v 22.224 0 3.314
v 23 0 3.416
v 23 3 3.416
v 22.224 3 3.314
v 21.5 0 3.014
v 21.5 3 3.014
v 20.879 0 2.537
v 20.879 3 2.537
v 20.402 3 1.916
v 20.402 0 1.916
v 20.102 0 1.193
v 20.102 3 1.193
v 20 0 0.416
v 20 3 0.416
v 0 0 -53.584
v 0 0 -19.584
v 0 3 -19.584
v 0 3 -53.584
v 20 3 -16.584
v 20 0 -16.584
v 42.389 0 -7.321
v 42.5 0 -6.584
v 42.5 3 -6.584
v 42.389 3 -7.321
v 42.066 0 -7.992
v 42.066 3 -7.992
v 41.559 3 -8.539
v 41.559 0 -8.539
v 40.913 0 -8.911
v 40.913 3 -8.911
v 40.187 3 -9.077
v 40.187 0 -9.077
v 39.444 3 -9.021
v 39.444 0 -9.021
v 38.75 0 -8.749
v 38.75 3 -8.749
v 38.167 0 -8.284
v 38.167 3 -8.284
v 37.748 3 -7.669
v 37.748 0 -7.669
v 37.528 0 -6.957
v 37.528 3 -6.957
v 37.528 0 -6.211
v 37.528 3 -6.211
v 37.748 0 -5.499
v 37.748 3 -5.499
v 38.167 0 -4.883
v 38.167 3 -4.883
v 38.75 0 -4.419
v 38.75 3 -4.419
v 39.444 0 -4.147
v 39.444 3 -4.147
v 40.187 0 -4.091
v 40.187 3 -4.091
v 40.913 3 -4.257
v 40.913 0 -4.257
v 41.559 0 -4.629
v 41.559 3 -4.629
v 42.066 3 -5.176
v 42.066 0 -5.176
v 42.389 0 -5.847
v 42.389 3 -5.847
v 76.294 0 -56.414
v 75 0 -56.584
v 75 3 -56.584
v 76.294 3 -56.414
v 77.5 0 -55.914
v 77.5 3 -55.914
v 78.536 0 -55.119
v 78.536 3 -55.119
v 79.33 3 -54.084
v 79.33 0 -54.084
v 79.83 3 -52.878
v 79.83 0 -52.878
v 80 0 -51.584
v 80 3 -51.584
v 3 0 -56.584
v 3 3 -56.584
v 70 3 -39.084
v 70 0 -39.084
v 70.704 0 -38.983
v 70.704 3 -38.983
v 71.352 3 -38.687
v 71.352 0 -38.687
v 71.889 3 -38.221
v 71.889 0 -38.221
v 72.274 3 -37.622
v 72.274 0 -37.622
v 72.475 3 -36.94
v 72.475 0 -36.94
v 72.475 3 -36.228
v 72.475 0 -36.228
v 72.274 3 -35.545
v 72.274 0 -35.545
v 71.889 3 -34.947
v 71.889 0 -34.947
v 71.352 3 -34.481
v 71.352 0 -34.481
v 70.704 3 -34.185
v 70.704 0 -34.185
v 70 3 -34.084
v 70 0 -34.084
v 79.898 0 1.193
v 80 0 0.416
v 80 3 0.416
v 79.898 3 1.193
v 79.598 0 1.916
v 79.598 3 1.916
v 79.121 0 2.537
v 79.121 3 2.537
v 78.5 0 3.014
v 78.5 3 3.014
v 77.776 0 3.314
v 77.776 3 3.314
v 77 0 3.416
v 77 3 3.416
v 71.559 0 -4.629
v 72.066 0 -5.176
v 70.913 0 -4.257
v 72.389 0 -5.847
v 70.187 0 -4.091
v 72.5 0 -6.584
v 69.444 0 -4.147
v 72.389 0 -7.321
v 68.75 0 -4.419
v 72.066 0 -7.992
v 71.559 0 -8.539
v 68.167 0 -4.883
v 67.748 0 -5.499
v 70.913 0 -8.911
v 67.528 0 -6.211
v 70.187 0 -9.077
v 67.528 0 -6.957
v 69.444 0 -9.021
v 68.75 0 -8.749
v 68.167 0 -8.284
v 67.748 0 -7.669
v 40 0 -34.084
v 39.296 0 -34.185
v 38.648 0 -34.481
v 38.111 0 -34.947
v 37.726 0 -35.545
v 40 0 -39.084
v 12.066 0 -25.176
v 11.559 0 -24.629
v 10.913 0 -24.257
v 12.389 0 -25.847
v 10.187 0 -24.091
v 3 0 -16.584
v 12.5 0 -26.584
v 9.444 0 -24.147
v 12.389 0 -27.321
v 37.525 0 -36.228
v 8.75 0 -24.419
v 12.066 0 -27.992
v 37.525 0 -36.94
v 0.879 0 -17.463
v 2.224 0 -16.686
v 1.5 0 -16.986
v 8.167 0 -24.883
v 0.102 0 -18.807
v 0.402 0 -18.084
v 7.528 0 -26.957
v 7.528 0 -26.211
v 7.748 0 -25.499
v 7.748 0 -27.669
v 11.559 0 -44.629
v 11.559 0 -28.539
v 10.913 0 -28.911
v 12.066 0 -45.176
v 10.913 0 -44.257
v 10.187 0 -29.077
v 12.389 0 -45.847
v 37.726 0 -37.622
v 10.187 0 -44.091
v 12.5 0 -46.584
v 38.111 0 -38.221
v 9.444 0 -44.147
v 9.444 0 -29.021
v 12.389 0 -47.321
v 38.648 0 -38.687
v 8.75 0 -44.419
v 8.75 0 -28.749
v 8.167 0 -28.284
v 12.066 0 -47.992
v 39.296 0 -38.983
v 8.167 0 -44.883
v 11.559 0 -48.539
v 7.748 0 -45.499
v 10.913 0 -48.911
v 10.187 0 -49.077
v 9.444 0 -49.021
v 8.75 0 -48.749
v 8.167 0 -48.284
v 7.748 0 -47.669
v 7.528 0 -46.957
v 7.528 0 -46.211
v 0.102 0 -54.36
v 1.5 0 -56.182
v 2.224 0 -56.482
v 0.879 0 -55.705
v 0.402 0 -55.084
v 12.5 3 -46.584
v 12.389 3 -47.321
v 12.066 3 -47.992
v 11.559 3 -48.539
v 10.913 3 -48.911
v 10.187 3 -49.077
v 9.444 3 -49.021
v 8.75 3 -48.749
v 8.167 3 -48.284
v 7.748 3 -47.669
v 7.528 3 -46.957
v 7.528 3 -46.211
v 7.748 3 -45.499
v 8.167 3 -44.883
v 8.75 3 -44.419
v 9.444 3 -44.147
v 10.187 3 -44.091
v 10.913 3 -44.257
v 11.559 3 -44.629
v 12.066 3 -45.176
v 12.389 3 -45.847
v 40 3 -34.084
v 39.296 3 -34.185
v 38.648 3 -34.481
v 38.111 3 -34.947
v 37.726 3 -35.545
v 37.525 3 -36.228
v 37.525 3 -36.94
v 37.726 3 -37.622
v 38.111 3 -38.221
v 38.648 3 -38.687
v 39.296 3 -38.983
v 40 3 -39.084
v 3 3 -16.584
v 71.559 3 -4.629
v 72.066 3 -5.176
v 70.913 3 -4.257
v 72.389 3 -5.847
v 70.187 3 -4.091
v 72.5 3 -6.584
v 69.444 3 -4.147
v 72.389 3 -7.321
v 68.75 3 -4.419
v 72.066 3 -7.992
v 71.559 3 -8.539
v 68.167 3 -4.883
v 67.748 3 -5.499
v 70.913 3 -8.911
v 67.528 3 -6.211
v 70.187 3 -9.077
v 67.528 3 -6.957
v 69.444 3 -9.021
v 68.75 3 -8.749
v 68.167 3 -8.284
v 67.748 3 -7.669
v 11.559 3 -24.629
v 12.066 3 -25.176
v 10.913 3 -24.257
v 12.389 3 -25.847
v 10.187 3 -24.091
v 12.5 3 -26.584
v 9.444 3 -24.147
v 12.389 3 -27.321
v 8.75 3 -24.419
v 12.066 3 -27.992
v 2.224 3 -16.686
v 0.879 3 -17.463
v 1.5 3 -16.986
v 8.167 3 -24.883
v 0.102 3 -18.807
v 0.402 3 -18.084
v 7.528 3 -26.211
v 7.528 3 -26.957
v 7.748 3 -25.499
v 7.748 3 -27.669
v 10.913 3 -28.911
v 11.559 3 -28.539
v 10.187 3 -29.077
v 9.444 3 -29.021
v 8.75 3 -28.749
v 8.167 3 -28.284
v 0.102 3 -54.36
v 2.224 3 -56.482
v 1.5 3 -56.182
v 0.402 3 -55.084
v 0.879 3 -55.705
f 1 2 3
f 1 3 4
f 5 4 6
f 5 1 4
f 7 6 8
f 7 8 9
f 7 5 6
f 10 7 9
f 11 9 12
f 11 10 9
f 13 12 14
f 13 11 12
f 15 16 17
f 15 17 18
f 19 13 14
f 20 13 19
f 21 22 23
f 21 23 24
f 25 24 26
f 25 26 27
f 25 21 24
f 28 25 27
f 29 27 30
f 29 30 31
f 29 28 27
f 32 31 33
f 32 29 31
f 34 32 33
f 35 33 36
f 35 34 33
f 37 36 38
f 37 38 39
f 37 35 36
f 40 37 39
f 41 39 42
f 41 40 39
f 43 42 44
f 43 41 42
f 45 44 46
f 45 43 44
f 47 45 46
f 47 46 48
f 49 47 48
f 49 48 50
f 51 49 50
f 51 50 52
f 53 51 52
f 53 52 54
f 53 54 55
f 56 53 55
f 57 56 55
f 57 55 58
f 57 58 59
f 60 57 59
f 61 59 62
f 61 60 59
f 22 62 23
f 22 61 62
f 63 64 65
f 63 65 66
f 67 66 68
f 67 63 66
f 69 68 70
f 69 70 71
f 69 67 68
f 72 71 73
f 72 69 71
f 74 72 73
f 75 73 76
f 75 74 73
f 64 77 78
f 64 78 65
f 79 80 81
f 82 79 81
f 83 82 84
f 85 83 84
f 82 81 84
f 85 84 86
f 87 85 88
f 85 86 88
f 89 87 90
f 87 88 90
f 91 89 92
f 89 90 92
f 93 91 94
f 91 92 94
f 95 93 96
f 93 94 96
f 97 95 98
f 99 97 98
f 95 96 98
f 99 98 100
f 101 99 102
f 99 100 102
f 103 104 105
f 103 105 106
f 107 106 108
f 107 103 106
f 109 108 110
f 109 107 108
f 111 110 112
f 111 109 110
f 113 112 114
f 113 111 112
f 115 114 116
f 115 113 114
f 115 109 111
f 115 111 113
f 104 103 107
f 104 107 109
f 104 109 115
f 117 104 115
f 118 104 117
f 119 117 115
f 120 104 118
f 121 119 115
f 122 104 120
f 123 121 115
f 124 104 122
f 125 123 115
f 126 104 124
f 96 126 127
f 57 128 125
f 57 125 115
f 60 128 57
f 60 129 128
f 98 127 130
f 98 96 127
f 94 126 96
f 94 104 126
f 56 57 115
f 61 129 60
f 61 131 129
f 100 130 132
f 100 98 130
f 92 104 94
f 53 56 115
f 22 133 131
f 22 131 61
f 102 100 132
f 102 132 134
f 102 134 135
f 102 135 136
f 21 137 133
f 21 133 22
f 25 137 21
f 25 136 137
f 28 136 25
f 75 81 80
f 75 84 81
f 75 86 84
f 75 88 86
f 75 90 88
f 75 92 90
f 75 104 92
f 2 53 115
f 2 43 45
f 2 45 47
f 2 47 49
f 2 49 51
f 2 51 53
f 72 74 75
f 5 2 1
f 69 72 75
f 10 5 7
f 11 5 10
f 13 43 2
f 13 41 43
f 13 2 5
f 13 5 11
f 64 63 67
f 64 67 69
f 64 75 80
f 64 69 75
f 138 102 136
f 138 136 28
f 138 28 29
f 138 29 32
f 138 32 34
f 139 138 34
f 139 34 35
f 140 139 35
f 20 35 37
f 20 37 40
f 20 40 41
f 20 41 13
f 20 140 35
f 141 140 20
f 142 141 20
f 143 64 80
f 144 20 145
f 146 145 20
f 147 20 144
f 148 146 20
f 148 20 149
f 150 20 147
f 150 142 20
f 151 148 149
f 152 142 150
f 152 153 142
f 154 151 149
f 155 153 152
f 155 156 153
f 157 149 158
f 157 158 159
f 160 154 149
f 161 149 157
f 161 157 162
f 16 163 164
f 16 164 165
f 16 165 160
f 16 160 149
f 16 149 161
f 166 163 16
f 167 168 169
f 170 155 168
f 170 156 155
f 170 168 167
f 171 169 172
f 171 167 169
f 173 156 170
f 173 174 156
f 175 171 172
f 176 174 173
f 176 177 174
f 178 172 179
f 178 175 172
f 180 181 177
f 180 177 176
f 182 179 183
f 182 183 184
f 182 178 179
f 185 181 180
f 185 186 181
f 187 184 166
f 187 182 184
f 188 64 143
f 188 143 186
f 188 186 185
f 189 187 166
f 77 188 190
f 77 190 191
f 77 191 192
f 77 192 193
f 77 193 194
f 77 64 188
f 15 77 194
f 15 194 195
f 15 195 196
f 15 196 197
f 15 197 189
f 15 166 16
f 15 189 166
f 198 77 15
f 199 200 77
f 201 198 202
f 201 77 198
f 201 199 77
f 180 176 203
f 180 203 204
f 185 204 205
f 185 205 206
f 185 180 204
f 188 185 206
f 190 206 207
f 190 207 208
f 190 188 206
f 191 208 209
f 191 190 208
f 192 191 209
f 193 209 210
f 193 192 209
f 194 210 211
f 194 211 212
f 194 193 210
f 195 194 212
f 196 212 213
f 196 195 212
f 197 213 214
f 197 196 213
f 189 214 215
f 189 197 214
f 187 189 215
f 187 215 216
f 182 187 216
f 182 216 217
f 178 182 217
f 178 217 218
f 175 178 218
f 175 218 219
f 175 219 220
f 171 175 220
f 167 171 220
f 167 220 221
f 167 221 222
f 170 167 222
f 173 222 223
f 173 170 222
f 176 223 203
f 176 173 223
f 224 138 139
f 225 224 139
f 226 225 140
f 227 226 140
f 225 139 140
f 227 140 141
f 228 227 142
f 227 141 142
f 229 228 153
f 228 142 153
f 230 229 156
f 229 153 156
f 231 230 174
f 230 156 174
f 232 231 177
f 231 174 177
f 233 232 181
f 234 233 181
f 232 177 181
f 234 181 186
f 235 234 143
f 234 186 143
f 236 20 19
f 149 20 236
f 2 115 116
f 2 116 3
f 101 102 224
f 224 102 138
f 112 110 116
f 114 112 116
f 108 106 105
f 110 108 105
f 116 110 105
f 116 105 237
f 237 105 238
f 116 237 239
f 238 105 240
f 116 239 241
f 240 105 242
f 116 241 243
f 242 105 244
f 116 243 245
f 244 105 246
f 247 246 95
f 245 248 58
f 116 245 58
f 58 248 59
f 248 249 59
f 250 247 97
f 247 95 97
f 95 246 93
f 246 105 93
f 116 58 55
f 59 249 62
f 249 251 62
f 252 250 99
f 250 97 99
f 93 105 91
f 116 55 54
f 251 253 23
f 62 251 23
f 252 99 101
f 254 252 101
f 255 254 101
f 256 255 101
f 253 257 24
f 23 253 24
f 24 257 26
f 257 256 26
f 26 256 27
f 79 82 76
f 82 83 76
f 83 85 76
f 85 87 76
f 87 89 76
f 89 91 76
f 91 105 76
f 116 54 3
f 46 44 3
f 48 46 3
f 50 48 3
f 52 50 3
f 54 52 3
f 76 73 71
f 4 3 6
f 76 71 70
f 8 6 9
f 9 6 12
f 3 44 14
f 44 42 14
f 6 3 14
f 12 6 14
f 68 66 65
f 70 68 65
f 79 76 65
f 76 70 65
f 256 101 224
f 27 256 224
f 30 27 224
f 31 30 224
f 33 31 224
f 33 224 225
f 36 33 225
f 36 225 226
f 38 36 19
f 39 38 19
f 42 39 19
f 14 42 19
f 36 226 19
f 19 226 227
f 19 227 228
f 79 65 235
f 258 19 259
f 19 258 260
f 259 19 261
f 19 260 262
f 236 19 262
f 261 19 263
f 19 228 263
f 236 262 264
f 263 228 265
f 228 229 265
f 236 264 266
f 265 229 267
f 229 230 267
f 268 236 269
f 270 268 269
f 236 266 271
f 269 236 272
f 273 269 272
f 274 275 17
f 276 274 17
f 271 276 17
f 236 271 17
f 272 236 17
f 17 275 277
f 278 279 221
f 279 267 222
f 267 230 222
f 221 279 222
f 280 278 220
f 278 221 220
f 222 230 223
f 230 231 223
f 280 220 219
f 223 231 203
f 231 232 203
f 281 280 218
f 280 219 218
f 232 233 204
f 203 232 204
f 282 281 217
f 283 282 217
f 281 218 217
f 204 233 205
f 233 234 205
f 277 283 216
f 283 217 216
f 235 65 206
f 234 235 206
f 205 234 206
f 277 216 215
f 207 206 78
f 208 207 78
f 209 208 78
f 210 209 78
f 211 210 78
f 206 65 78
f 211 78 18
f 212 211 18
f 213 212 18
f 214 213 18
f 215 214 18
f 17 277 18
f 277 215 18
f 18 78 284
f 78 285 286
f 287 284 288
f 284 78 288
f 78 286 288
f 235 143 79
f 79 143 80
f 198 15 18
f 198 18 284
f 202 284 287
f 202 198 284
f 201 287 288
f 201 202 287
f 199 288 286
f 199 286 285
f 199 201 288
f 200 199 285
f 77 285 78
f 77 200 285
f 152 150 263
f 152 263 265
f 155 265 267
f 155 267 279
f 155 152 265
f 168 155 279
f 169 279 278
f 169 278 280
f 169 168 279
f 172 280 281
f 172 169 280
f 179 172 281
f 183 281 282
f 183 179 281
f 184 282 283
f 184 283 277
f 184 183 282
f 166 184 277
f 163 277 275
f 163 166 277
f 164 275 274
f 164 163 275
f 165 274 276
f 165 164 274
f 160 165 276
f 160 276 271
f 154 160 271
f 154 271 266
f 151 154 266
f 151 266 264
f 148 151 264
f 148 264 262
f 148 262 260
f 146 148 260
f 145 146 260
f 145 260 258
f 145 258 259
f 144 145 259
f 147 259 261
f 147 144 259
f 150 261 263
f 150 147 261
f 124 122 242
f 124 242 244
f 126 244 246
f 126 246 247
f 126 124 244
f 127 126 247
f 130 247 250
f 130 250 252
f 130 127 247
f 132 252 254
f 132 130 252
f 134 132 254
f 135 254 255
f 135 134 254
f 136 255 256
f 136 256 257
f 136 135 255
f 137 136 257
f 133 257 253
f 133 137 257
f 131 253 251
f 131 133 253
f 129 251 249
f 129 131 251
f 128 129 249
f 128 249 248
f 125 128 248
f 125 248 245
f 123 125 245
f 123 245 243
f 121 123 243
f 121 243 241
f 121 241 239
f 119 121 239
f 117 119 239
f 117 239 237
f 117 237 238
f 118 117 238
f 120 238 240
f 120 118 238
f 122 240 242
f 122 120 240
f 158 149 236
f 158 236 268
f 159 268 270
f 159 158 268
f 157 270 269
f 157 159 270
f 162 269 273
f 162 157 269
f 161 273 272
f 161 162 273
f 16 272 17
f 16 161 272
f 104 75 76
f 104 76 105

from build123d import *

# Parameters (mm, degrees)
SKETCH1_R           = 2.5
BOSS_EXTRUDE2_DEPTH = 3


with BuildPart() as part:
    # Sketch1 → Boss-Extrude2 (new body)
    with BuildSketch(Plane(origin=(0, 0, 0), x_dir=(1, 0, 0), z_dir=(0, 1, 0))):
        with BuildLine():
            Line((0, 19.583928173), (0, 53.583928173))
            ThreePointArc((0, 53.583928173), (0.878679656, 55.705248517), (3, 56.583928173))
            Line((3, 56.583928173), (75, 56.583928173))
            ThreePointArc((75, 56.583928173), (78.535533906, 55.119462079), (80, 51.583928173))
            Line((80, 51.583928173), (80, -0.416071827))
            ThreePointArc((80, -0.416071827), (79.121320344, -2.537392171), (77, -3.416071827))
            Line((77, -3.416071827), (23, -3.416071827))
            ThreePointArc((23, -3.416071827), (20.878679656, -2.537392171), (20, -0.416071827))
            Line((20, -0.416071827), (20, 16.583928173))
            Line((20, 16.583928173), (3, 16.583928173))
            ThreePointArc((3, 16.583928173), (0.878679656, 17.462607829), (0, 19.583928173))
        make_face()
        with Locations((10, 26.583928173)):
            Circle(SKETCH1_R, mode=Mode.SUBTRACT)
        with Locations((40, 6.583928173)):
            Circle(SKETCH1_R, mode=Mode.SUBTRACT)
        with Locations((70, 6.583928173)):
            Circle(SKETCH1_R, mode=Mode.SUBTRACT)
        with Locations((10, 46.583928173)):
            Circle(SKETCH1_R, mode=Mode.SUBTRACT)
        with BuildLine():
            Line((40, 39.083928173), (70, 39.083928173))
            ThreePointArc((70, 39.083928173), (72.5, 36.583928173), (70, 34.083928173))
            Line((70, 34.083928173), (40, 34.083928173))
            ThreePointArc((40, 34.083928173), (37.5, 36.583928173), (40, 39.083928173))
        make_face(mode=Mode.SUBTRACT)
    extrude(amount=BOSS_EXTRUDE2_DEPTH)


solid = part.part
